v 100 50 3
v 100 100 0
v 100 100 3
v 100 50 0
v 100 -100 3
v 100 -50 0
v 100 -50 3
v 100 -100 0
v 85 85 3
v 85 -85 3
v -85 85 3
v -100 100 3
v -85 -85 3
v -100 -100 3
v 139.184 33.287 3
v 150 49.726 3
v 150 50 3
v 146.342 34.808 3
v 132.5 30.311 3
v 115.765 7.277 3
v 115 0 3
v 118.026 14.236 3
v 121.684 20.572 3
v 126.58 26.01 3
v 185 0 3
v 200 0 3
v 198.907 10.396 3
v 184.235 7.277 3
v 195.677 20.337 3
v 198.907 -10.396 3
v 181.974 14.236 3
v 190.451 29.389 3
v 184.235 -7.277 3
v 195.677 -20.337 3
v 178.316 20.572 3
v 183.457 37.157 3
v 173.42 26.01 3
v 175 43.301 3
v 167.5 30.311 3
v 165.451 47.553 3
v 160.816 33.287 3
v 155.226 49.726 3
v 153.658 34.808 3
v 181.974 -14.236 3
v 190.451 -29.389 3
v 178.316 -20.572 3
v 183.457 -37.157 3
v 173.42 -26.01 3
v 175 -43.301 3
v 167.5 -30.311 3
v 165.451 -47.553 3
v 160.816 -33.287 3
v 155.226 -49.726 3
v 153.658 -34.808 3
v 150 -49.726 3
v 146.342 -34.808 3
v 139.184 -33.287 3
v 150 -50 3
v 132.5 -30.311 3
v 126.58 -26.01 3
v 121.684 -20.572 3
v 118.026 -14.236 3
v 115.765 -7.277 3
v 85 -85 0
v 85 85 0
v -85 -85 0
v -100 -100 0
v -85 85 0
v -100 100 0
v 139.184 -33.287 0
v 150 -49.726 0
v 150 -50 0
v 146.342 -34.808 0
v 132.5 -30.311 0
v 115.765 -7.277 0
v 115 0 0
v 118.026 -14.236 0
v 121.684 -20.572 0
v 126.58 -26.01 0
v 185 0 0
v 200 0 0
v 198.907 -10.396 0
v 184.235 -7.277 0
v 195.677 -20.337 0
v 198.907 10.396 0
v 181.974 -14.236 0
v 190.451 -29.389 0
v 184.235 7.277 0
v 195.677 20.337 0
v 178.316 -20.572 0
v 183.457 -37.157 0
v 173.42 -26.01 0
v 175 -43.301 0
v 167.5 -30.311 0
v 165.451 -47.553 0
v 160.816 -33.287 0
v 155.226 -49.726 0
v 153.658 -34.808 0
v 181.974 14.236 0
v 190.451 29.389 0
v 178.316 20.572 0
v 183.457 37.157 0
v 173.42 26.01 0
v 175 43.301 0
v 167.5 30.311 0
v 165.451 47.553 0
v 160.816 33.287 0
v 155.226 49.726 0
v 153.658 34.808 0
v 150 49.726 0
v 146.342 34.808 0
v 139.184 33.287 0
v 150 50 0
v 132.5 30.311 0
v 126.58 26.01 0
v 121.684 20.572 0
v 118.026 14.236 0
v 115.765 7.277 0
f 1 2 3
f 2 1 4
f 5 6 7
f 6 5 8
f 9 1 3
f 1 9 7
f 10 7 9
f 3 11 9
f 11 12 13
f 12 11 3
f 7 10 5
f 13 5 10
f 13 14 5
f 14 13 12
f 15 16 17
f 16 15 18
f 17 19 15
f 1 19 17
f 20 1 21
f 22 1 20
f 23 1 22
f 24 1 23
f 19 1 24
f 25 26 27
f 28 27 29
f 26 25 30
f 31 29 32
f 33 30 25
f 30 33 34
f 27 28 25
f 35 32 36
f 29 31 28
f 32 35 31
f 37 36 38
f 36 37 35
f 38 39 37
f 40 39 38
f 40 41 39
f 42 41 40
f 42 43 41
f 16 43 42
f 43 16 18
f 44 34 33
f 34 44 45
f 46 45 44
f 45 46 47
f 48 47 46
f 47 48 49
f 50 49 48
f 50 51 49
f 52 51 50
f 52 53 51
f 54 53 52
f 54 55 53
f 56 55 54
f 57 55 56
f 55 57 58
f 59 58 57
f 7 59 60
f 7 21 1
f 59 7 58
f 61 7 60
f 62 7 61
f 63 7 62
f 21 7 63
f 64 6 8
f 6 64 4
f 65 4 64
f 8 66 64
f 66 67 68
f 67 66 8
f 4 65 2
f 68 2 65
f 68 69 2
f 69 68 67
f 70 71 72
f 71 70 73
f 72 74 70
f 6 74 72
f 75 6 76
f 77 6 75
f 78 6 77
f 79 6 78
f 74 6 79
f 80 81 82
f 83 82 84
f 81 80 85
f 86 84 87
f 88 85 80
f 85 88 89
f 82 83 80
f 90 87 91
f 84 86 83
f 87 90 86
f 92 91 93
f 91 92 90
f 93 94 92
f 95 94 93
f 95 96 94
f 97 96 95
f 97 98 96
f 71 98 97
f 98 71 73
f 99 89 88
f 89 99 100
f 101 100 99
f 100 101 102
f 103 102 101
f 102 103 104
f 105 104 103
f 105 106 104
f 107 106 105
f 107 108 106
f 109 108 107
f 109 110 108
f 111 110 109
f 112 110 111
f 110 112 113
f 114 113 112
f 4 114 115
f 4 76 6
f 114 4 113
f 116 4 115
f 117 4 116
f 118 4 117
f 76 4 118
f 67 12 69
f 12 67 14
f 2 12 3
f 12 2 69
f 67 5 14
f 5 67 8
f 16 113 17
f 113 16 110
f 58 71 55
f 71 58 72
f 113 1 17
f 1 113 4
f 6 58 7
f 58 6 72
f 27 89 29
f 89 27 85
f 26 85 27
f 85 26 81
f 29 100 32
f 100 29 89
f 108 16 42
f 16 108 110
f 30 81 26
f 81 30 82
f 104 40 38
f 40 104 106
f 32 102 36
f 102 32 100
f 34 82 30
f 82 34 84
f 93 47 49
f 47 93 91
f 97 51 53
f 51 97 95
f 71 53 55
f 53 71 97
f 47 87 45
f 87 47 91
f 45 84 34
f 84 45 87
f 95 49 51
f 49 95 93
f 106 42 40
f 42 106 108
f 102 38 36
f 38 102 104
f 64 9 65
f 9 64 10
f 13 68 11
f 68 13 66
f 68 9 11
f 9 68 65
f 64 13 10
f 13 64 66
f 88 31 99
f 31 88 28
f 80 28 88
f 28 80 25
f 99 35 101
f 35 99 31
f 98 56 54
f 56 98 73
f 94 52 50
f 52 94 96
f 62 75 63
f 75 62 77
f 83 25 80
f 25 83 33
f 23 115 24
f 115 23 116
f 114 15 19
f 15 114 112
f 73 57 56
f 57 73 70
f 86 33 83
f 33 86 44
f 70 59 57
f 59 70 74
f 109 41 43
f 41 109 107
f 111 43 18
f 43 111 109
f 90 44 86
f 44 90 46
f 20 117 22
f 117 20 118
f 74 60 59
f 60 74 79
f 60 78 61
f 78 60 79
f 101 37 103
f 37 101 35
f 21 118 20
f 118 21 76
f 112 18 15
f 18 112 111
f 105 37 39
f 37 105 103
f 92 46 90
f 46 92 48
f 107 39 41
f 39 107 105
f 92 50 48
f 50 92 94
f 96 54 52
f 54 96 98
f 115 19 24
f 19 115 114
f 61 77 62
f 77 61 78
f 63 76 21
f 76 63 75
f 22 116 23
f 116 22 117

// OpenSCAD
// file: config.scad
plate_length=200;
plate_width=200;
ext_length=100;
ext_width=100;
height=10;
wall_thickness=15;

collar_height = 16;
collar_r = 46/2;

lid_thickness=3;


pcb_pocket_depth = 1;
pcb_length=100;
pcb_width=150;
// main file
include <config.scad>;

module lid_plate() {
	cube([plate_length, plate_width, lid_thickness], center=true);
	translate([plate_length/2,0,0])
		cube([ext_length, ext_width, lid_thickness], center=true);
	translate([plate_length/2 + ext_length/2,0,-lid_thickness/2])
		cylinder(r=ext_width/2,h=lid_thickness);
}

module lid_hole() {
	pocket_length = plate_length - wall_thickness * 2;
	pocket_width = plate_width - wall_thickness * 2;
	cube([pocket_length, pocket_width, lid_thickness], center=true);
	translate([plate_length/2 + ext_length/2,0,-lid_thickness/2])
		cylinder(r=(ext_width-wall_thickness*2)/2, h=lid_thickness);
}

module lid() {
	translate([0,0,lid_thickness/2])
	difference() {
		lid_plate();
		lid_hole();
	}
}

lid();
